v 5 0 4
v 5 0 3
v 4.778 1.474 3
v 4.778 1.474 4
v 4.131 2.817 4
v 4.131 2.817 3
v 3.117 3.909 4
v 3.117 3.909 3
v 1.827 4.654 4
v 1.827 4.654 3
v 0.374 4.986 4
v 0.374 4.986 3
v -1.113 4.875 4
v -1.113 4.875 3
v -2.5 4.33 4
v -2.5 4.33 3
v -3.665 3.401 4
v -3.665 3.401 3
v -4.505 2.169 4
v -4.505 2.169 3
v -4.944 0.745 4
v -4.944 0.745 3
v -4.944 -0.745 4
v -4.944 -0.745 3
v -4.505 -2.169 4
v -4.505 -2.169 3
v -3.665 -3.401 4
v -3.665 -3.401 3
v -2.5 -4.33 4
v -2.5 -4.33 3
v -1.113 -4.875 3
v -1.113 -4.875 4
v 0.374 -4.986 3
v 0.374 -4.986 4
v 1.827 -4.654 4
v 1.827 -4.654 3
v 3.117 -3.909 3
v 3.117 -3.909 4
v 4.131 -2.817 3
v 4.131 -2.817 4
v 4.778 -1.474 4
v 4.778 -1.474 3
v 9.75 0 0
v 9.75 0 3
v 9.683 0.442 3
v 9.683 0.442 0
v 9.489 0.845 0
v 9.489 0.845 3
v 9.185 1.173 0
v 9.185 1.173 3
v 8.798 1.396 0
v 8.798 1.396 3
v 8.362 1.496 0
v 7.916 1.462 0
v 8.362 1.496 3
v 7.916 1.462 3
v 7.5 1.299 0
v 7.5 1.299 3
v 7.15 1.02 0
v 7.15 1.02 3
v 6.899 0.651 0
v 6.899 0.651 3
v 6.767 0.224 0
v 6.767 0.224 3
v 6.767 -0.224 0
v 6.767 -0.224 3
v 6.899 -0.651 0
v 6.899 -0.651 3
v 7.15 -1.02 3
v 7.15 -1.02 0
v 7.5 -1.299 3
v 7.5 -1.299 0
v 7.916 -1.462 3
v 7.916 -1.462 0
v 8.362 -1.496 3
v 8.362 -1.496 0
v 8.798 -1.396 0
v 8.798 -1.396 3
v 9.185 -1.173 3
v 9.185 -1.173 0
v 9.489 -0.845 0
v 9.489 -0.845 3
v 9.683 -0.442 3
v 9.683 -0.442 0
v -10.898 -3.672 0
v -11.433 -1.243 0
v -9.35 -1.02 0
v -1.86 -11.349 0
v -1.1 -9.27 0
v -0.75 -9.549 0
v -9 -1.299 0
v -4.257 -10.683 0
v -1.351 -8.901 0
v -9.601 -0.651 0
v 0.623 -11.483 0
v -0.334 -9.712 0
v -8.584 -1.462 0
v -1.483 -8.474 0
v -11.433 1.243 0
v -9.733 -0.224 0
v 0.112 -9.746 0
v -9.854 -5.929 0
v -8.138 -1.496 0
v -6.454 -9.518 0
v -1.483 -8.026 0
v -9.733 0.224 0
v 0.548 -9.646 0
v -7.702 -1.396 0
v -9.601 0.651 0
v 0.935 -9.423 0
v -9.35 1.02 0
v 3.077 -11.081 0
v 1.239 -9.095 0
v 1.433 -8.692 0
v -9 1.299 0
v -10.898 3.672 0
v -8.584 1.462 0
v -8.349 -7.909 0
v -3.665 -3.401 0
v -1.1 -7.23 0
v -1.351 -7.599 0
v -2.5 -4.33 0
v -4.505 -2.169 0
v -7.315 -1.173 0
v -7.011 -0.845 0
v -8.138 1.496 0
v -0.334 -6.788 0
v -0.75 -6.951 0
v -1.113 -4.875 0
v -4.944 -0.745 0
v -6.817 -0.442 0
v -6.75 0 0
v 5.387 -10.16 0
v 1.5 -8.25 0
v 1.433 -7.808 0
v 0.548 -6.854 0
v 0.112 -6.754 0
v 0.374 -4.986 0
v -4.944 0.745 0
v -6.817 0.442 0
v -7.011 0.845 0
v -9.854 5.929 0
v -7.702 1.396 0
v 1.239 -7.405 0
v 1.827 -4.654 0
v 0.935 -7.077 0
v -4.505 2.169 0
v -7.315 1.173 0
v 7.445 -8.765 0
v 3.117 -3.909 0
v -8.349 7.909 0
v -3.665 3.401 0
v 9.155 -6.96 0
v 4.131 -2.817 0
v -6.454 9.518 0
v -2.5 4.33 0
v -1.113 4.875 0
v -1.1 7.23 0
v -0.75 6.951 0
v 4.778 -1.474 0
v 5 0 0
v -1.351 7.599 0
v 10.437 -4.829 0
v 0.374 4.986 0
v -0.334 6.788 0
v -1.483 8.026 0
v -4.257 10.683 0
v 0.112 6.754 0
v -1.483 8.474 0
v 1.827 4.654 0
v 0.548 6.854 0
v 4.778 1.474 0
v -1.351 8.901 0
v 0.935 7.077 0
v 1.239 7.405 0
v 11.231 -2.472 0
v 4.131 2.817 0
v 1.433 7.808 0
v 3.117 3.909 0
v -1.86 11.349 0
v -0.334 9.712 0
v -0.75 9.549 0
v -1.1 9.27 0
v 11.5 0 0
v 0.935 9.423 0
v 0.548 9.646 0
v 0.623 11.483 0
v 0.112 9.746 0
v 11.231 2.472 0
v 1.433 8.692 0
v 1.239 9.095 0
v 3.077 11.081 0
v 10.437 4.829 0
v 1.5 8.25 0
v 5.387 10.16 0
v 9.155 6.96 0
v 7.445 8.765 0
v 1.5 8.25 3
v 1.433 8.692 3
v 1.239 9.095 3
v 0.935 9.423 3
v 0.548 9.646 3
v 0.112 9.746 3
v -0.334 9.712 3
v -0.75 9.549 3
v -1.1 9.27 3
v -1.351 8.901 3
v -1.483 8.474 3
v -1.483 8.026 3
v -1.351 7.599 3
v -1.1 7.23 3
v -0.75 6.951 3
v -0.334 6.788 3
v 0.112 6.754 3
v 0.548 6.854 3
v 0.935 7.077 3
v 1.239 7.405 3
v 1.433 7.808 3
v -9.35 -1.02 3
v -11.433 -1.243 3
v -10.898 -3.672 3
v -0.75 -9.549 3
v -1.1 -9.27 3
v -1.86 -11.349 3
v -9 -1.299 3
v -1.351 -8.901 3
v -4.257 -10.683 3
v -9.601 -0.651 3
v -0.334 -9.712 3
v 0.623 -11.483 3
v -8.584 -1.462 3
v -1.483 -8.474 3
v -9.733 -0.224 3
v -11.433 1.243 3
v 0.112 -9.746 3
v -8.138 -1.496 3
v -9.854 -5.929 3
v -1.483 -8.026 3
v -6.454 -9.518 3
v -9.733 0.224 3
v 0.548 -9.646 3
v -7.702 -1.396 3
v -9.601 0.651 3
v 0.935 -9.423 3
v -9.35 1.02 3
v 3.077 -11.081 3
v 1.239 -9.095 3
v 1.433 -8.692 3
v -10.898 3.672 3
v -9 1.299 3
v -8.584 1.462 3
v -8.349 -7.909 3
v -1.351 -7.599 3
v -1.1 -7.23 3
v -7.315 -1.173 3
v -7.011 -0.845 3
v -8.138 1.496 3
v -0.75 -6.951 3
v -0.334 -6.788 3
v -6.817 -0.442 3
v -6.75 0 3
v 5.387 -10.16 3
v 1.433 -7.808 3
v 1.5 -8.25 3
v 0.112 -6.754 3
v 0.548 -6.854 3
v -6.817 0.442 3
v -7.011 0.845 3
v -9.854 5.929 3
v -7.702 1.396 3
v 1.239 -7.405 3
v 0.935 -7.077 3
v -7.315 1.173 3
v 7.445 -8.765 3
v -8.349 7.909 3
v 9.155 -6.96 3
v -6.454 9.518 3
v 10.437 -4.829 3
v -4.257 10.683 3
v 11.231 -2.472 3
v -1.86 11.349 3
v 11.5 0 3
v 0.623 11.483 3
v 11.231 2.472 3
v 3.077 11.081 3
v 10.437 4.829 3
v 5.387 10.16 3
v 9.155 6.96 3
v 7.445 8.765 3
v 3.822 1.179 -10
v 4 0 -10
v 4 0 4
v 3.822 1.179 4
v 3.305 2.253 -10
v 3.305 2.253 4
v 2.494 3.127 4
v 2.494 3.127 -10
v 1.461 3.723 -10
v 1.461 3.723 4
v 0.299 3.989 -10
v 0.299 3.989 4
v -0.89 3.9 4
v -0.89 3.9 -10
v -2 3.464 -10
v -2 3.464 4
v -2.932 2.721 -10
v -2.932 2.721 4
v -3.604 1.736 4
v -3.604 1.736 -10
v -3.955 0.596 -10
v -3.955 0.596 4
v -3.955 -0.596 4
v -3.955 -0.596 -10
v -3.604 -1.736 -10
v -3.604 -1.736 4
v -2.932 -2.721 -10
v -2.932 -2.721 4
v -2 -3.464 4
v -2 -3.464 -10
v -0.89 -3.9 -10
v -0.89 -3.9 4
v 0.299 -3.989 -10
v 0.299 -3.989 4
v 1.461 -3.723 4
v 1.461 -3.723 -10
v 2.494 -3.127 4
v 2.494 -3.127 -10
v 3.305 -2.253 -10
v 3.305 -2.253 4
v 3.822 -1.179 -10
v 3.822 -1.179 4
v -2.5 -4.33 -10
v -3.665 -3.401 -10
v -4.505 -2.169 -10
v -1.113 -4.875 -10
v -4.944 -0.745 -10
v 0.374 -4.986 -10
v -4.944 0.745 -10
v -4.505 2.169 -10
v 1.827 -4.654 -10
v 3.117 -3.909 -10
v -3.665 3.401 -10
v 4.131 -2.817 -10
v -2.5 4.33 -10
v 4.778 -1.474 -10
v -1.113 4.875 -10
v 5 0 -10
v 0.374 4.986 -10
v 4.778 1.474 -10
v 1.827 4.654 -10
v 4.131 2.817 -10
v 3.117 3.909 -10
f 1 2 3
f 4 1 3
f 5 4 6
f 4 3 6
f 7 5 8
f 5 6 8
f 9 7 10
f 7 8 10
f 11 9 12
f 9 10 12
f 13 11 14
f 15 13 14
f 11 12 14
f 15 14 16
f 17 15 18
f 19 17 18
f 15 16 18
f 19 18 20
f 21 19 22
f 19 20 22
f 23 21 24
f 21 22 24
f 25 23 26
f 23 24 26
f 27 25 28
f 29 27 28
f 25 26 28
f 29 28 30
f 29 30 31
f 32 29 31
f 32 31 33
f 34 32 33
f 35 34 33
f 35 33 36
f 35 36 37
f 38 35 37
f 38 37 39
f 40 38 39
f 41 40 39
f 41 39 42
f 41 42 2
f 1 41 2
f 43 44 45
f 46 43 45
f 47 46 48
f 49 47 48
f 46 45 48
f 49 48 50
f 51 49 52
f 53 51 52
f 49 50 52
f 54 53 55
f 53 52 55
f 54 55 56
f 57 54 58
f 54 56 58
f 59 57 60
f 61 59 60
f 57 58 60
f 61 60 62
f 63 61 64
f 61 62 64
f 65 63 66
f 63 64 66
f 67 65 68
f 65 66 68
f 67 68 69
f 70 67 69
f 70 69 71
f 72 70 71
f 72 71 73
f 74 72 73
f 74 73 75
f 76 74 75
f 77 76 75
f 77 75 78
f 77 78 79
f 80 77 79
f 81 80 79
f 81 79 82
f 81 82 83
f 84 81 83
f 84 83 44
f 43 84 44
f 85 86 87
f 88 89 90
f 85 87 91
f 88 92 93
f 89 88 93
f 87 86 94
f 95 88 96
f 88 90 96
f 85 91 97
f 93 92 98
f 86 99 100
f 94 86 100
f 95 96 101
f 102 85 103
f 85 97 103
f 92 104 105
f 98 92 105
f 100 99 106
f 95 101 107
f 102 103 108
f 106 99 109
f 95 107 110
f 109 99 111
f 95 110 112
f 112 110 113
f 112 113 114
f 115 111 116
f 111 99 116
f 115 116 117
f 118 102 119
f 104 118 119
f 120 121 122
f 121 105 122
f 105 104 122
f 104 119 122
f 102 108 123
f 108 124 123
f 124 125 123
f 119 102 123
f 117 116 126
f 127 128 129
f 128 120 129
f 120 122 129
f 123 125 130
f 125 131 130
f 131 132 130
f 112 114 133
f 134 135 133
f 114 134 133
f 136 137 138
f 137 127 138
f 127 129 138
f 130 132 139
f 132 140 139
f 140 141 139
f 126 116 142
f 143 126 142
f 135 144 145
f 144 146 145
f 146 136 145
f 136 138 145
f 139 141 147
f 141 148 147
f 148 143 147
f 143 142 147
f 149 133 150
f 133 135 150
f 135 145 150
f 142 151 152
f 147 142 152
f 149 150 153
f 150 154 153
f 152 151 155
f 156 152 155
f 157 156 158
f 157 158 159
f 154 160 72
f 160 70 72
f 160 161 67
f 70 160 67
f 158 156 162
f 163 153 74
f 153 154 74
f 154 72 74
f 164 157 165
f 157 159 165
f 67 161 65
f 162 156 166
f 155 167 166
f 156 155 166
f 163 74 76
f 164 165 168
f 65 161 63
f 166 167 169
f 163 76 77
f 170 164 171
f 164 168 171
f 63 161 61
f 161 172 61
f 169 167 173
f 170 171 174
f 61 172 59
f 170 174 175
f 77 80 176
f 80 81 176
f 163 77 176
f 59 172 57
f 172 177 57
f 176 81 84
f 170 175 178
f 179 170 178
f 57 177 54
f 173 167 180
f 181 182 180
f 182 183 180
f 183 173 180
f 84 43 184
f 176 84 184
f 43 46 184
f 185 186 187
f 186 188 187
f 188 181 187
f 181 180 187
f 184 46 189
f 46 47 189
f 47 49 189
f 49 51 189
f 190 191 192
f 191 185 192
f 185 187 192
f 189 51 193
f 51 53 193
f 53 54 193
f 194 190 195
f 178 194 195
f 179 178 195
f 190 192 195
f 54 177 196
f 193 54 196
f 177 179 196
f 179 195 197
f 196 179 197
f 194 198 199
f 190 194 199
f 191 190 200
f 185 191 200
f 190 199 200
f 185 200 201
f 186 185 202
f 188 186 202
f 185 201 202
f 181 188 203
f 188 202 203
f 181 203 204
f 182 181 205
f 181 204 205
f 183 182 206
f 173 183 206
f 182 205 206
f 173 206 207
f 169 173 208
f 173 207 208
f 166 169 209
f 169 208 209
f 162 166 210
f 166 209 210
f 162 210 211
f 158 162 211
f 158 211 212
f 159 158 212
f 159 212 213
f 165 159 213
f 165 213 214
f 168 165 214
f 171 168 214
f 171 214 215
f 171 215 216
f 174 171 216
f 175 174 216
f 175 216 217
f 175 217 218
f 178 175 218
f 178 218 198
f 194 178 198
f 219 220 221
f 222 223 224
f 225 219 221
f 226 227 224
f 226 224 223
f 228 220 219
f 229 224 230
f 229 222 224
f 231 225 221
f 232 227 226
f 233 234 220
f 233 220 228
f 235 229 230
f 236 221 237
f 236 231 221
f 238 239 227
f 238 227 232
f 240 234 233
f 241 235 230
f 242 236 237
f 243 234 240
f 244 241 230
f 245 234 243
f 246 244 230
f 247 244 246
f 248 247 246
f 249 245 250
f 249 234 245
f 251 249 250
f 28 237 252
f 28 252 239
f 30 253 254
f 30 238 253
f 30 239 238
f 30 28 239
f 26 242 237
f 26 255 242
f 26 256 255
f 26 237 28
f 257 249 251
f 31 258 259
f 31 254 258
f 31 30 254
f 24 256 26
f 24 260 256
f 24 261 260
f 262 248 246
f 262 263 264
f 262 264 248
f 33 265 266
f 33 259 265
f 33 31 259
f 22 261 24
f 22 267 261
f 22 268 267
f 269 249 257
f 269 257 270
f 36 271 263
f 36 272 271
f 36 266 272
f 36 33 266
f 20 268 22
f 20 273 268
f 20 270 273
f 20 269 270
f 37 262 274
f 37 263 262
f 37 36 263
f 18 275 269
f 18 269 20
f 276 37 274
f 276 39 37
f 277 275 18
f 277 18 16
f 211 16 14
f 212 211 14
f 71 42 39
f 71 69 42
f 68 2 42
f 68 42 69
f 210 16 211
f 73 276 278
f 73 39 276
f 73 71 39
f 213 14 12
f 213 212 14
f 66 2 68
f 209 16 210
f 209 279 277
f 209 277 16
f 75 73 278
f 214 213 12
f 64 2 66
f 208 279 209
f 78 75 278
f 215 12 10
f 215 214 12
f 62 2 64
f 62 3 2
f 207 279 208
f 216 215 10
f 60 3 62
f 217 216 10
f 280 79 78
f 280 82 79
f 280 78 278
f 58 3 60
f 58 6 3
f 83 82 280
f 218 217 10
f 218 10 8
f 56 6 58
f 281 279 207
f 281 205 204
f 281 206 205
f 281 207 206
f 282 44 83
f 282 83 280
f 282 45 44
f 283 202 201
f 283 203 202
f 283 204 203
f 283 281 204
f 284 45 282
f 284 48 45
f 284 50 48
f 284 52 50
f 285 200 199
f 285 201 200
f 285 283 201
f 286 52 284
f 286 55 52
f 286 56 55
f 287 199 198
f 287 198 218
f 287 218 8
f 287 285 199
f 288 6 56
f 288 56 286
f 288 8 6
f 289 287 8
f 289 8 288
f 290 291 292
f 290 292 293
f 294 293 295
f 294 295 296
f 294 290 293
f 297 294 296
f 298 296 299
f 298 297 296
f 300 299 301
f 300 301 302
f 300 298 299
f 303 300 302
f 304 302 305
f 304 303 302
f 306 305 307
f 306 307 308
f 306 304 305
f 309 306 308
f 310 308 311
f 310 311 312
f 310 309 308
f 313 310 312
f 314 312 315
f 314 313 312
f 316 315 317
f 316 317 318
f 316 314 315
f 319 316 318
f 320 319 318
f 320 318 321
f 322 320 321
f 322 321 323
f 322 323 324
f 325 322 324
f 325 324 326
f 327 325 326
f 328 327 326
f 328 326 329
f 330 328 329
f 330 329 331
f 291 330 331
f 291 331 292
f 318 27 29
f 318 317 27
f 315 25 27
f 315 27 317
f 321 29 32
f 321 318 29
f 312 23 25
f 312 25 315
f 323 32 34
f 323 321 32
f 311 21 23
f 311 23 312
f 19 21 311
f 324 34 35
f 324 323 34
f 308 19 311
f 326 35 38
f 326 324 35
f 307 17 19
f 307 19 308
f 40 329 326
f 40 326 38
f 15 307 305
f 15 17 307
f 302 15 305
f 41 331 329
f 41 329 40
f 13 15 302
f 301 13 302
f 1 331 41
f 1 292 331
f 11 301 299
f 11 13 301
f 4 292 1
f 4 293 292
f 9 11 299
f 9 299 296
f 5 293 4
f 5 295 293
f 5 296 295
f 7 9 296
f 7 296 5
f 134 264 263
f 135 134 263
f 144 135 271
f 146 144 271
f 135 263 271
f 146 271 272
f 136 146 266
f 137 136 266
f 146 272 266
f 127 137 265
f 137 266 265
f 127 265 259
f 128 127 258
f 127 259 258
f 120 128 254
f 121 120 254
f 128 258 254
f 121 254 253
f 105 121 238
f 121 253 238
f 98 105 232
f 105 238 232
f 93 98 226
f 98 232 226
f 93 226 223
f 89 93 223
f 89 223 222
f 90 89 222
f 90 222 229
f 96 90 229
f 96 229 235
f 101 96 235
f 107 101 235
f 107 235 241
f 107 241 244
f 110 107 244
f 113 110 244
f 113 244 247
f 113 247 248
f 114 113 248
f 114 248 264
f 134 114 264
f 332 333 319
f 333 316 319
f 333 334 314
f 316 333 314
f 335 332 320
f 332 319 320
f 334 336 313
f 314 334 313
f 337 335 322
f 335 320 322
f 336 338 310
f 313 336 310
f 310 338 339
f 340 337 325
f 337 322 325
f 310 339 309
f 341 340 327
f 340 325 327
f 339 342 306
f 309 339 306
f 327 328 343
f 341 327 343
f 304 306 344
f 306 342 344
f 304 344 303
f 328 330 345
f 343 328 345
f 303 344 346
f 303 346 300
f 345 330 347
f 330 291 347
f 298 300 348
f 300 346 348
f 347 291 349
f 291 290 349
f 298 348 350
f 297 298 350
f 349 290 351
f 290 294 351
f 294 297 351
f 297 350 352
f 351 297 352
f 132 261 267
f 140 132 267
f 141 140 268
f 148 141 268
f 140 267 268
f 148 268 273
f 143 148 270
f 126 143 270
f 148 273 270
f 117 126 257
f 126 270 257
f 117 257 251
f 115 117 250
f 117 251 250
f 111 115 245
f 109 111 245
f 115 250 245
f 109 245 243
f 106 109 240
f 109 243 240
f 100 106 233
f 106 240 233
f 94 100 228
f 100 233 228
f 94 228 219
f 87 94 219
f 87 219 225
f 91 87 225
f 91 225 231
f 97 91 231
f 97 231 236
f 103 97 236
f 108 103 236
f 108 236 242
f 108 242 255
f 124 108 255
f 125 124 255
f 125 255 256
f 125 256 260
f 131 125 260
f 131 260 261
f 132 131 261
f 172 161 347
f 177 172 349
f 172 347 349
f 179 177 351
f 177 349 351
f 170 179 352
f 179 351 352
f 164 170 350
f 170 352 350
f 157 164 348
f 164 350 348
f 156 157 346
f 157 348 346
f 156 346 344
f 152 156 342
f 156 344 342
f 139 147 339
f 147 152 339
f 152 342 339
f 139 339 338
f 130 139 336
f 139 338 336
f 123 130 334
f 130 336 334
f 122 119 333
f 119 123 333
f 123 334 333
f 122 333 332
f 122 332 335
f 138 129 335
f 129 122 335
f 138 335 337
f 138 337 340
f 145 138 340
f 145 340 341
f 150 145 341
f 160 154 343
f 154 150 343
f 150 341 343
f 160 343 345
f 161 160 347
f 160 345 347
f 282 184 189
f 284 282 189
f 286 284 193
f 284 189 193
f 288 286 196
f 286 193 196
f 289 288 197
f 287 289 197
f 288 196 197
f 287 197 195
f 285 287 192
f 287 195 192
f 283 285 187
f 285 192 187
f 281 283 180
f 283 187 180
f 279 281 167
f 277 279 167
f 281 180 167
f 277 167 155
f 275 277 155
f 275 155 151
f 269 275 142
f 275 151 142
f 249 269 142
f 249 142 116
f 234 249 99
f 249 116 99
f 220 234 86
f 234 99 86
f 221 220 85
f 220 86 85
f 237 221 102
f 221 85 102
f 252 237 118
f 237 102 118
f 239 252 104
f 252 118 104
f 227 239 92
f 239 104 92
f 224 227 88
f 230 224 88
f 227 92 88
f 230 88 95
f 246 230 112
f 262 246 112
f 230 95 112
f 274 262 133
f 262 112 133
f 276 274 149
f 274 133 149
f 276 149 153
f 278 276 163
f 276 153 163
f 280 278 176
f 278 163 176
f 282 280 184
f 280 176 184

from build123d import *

# Parameters (mm, degrees)
SKETCH1_R                = 11.5
BOSS_EXTRUDE1_DEPTH      = 3
BOSS_EXTRUDE2_DEPTH      = 1
BOSS_EXTRUDE2_DEPTH_BACK = 13
SKETCH2_R                = 5
SKETCH2_R_2              = 4
SKETCH3_R                = 4
CUT_EXTRUDE1_DEPTH       = 5
SKETCH4_R                = 1.5
CUT_EXTRUDE2_DEPTH       = 5


with BuildPart() as part:
    # Sketch1 → Boss-Extrude1 (new body)
    with BuildSketch(Plane.XY):
        Circle(SKETCH1_R)
    extrude(amount=BOSS_EXTRUDE1_DEPTH)

    # Sketch2 → Boss-Extrude2 (add, two sides: drawn at the far end of the back side and taken through both)
    with BuildSketch(Plane.XY.offset(3).offset(-BOSS_EXTRUDE2_DEPTH_BACK)):
        Circle(SKETCH2_R)
        Circle(SKETCH2_R_2, mode=Mode.SUBTRACT)
    extrude(amount=BOSS_EXTRUDE2_DEPTH + BOSS_EXTRUDE2_DEPTH_BACK)

    # Sketch3 → Cut-Extrude1 (cut)
    with BuildSketch(Plane.XY.offset(3)):
        Circle(SKETCH3_R)
    extrude(amount=-CUT_EXTRUDE1_DEPTH, mode=Mode.SUBTRACT)

    # Sketch4 → Cut-Extrude2 (cut)
    with BuildSketch(Plane.XY.offset(3)):
        with Locations((0, 8.25)):
            Circle(SKETCH4_R)
        with Locations((8.25, 0)):
            Circle(SKETCH4_R)
        with Locations((0, -8.25)):
            Circle(SKETCH4_R)
        with Locations((-8.25, 0)):
            Circle(SKETCH4_R)
    extrude(amount=-CUT_EXTRUDE2_DEPTH, mode=Mode.SUBTRACT)


solid = part.part
